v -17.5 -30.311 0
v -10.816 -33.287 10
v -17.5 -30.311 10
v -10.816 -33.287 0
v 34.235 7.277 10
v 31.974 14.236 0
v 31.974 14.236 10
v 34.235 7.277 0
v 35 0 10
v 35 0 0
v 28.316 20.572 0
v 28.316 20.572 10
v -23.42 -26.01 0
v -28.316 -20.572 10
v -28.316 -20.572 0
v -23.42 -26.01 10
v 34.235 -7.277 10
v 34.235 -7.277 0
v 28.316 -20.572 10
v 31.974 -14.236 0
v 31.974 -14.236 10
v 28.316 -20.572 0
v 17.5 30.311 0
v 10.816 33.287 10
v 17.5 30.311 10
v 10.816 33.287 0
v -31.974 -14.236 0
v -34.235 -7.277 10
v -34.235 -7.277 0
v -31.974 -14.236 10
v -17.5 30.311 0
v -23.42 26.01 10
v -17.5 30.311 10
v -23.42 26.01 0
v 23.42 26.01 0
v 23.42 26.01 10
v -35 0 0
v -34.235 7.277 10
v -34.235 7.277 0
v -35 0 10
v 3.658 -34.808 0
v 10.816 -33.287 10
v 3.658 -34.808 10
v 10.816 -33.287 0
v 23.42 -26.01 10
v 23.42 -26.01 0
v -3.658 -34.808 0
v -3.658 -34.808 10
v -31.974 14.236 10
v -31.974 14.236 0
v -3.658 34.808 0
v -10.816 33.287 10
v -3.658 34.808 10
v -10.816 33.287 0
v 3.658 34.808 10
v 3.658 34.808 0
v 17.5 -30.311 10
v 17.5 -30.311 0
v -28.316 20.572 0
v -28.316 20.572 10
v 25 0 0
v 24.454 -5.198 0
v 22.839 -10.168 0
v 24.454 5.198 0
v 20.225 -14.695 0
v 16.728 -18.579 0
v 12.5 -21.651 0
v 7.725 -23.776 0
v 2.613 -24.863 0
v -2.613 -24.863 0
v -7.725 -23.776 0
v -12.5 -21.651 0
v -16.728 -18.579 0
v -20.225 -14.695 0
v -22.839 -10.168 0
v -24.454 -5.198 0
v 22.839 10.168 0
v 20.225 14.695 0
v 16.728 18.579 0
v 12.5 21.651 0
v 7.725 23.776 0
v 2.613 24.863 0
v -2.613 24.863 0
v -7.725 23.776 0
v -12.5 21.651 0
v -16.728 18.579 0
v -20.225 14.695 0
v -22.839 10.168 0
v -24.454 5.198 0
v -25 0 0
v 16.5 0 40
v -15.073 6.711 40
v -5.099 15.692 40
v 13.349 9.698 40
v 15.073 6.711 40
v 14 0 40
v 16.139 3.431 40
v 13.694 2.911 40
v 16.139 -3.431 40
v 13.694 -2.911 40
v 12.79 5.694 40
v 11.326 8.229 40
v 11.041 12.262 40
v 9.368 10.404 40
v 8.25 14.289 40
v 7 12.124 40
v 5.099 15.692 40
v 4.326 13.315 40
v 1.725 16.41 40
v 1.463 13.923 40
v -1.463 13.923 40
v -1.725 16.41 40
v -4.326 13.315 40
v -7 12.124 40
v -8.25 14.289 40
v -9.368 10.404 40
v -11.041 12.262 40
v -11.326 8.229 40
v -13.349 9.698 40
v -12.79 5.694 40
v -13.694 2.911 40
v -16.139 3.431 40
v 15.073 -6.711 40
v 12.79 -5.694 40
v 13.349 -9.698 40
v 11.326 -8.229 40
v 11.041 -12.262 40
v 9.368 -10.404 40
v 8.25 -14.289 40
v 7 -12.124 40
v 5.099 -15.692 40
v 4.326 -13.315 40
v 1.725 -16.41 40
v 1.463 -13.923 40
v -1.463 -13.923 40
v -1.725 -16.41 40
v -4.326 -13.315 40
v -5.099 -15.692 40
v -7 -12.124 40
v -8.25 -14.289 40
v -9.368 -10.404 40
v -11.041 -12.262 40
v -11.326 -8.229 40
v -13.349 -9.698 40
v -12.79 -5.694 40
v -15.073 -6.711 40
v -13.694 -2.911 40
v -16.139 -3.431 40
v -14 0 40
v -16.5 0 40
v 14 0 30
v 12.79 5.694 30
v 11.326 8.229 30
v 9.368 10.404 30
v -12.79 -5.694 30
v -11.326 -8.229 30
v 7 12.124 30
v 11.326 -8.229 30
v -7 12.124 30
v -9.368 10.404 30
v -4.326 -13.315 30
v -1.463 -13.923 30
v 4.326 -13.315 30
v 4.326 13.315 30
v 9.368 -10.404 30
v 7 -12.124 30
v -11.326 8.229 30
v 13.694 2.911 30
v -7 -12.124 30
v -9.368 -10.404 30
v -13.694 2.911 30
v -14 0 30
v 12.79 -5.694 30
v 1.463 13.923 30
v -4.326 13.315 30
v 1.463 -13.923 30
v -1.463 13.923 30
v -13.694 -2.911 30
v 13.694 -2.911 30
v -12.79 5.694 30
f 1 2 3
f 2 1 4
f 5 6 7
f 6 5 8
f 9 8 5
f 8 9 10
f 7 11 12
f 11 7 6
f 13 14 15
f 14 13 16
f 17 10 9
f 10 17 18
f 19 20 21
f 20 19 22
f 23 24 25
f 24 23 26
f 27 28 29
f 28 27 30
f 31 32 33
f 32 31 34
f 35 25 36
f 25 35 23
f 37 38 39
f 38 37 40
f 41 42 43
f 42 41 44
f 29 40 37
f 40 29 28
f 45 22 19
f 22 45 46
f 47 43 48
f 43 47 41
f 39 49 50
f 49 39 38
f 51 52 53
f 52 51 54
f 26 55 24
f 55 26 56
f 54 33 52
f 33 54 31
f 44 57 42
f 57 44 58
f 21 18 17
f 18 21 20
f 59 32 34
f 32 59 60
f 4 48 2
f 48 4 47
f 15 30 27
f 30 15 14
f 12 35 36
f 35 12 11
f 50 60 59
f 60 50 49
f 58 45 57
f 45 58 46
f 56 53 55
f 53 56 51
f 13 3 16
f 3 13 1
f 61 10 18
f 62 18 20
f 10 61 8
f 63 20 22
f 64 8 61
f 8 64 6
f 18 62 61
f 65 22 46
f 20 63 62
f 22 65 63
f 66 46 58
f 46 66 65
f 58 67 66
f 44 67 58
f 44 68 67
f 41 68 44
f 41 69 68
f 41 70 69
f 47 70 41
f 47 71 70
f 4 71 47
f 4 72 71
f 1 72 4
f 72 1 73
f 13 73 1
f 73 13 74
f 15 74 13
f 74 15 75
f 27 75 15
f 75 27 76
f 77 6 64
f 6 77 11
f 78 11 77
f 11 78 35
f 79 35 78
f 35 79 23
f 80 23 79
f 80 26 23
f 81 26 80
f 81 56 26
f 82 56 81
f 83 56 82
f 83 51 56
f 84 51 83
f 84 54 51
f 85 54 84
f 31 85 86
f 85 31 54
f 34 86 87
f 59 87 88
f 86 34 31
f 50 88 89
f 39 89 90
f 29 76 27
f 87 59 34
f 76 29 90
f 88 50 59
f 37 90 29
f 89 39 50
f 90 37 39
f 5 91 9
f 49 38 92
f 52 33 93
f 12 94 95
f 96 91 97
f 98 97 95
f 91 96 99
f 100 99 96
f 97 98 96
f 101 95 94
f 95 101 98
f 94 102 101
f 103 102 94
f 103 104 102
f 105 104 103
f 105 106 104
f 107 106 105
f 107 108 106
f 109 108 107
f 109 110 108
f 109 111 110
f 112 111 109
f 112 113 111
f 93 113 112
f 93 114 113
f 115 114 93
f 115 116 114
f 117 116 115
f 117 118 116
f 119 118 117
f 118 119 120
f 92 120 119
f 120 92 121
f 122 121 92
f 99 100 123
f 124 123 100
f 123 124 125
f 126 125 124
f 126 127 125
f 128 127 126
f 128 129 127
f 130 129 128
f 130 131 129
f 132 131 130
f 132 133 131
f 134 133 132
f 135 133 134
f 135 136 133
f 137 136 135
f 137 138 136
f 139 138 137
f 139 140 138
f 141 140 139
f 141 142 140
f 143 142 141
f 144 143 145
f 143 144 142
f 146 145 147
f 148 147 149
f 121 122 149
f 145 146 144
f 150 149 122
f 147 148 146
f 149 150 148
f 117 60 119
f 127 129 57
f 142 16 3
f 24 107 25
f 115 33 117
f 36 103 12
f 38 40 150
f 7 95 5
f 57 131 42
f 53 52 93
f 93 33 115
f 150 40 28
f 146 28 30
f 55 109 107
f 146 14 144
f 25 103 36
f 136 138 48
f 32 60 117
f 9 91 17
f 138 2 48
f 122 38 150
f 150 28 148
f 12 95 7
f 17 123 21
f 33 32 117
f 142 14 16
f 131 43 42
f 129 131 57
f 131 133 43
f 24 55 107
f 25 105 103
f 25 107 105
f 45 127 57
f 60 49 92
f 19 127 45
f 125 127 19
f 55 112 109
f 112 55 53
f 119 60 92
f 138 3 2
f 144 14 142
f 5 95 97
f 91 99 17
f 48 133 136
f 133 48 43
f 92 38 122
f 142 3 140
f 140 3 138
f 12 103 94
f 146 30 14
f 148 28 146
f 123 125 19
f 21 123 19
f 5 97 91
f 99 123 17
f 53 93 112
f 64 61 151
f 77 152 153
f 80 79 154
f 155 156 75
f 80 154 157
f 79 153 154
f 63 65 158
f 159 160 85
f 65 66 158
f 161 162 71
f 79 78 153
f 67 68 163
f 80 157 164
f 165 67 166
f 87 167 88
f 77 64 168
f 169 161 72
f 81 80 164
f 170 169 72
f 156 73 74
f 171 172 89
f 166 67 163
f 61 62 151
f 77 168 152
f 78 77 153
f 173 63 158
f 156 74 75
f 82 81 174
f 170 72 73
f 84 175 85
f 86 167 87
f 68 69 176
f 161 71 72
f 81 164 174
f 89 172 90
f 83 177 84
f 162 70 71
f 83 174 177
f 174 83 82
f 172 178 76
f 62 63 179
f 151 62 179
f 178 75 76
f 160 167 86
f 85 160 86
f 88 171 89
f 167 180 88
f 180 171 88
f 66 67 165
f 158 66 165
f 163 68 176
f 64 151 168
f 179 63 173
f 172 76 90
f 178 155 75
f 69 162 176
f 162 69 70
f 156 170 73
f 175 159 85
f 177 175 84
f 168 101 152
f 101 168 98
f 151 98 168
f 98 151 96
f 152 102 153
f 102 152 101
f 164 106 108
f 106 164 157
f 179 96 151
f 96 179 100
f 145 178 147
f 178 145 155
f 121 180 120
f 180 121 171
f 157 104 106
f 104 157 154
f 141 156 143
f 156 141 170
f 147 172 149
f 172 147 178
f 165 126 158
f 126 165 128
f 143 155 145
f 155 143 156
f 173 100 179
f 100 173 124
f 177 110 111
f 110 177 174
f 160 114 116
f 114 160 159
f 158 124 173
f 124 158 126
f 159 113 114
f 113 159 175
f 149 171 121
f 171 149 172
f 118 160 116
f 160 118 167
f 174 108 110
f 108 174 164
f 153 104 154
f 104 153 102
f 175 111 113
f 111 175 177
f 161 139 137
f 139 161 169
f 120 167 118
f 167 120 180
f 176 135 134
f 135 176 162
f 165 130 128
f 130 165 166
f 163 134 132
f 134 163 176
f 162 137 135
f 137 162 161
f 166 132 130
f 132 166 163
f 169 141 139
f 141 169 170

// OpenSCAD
// NOTE: Please refer to the picture with drawing to get all the variables explained in details
/* [Outer Size] */
//Diameter of the pipe
pipe_diameter=28;
//Diameter of the base
base_diameter=70;
//Height of the base, before the loft will start
base_height=10;
// Height of the part with loft from base to to pipe diameter
loft_height=30;
// Note: Total height of part = loft_height + base_height
// Please refer to picture with drawing to better understand the variables, if in doubt
/* [Inner space] */
//Difference of the inner space's diameter to inner space's diameter at base level 
base_inner_diameter_decrease=20;
// Difference of top diameter to pipe's diameter
top_add_diameter=5;


/* [ Split into two halves?]*/
split=0; // [1:Yes, 0:No]
// Space between two halves 
space=30;
/* [Hidden]*/

if (split) {
// draw base as circle
difference(){
    draw_cap();
//subtract half of cap
translate([-base_diameter/2,0,0]) {
    cube([base_diameter,base_diameter/2,base_height+loft_height],center=false);
}
}
translate ([0,space,0]) {
    rotate ([0,0,180]){
    mirror ([1,0,0]){
difference(){
    draw_cap();
//subtract half of cap
translate([-base_diameter/2,0,0]) {
    cube([base_diameter,base_diameter/2,base_height+loft_height],center=false);
}
}
 }   
}
}
}else{
    draw_cap();
}



// make two halfs


module draw_cap(){
     difference(){ 
    union(){
        //draw the base
        cylinder(h=base_height, r=base_diameter/2, center=false);
        //draw the loft
        translate ([0,0,base_height]){
            cylinder(h=loft_height, r1=base_diameter/2, r2=(top_add_diameter+pipe_diameter)/2, center=false);
        }
    }
    //subtract the inner space
    translate ([0,0,0]){
          cylinder(h=loft_height, r1=(base_diameter-base_inner_diameter_decrease)/2, r2=pipe_diameter/2, center=false);
    }
    translate ([0,0,loft_height]) {
          cylinder(h=base_height, r=pipe_diameter/2, center=false);
    }}

}
